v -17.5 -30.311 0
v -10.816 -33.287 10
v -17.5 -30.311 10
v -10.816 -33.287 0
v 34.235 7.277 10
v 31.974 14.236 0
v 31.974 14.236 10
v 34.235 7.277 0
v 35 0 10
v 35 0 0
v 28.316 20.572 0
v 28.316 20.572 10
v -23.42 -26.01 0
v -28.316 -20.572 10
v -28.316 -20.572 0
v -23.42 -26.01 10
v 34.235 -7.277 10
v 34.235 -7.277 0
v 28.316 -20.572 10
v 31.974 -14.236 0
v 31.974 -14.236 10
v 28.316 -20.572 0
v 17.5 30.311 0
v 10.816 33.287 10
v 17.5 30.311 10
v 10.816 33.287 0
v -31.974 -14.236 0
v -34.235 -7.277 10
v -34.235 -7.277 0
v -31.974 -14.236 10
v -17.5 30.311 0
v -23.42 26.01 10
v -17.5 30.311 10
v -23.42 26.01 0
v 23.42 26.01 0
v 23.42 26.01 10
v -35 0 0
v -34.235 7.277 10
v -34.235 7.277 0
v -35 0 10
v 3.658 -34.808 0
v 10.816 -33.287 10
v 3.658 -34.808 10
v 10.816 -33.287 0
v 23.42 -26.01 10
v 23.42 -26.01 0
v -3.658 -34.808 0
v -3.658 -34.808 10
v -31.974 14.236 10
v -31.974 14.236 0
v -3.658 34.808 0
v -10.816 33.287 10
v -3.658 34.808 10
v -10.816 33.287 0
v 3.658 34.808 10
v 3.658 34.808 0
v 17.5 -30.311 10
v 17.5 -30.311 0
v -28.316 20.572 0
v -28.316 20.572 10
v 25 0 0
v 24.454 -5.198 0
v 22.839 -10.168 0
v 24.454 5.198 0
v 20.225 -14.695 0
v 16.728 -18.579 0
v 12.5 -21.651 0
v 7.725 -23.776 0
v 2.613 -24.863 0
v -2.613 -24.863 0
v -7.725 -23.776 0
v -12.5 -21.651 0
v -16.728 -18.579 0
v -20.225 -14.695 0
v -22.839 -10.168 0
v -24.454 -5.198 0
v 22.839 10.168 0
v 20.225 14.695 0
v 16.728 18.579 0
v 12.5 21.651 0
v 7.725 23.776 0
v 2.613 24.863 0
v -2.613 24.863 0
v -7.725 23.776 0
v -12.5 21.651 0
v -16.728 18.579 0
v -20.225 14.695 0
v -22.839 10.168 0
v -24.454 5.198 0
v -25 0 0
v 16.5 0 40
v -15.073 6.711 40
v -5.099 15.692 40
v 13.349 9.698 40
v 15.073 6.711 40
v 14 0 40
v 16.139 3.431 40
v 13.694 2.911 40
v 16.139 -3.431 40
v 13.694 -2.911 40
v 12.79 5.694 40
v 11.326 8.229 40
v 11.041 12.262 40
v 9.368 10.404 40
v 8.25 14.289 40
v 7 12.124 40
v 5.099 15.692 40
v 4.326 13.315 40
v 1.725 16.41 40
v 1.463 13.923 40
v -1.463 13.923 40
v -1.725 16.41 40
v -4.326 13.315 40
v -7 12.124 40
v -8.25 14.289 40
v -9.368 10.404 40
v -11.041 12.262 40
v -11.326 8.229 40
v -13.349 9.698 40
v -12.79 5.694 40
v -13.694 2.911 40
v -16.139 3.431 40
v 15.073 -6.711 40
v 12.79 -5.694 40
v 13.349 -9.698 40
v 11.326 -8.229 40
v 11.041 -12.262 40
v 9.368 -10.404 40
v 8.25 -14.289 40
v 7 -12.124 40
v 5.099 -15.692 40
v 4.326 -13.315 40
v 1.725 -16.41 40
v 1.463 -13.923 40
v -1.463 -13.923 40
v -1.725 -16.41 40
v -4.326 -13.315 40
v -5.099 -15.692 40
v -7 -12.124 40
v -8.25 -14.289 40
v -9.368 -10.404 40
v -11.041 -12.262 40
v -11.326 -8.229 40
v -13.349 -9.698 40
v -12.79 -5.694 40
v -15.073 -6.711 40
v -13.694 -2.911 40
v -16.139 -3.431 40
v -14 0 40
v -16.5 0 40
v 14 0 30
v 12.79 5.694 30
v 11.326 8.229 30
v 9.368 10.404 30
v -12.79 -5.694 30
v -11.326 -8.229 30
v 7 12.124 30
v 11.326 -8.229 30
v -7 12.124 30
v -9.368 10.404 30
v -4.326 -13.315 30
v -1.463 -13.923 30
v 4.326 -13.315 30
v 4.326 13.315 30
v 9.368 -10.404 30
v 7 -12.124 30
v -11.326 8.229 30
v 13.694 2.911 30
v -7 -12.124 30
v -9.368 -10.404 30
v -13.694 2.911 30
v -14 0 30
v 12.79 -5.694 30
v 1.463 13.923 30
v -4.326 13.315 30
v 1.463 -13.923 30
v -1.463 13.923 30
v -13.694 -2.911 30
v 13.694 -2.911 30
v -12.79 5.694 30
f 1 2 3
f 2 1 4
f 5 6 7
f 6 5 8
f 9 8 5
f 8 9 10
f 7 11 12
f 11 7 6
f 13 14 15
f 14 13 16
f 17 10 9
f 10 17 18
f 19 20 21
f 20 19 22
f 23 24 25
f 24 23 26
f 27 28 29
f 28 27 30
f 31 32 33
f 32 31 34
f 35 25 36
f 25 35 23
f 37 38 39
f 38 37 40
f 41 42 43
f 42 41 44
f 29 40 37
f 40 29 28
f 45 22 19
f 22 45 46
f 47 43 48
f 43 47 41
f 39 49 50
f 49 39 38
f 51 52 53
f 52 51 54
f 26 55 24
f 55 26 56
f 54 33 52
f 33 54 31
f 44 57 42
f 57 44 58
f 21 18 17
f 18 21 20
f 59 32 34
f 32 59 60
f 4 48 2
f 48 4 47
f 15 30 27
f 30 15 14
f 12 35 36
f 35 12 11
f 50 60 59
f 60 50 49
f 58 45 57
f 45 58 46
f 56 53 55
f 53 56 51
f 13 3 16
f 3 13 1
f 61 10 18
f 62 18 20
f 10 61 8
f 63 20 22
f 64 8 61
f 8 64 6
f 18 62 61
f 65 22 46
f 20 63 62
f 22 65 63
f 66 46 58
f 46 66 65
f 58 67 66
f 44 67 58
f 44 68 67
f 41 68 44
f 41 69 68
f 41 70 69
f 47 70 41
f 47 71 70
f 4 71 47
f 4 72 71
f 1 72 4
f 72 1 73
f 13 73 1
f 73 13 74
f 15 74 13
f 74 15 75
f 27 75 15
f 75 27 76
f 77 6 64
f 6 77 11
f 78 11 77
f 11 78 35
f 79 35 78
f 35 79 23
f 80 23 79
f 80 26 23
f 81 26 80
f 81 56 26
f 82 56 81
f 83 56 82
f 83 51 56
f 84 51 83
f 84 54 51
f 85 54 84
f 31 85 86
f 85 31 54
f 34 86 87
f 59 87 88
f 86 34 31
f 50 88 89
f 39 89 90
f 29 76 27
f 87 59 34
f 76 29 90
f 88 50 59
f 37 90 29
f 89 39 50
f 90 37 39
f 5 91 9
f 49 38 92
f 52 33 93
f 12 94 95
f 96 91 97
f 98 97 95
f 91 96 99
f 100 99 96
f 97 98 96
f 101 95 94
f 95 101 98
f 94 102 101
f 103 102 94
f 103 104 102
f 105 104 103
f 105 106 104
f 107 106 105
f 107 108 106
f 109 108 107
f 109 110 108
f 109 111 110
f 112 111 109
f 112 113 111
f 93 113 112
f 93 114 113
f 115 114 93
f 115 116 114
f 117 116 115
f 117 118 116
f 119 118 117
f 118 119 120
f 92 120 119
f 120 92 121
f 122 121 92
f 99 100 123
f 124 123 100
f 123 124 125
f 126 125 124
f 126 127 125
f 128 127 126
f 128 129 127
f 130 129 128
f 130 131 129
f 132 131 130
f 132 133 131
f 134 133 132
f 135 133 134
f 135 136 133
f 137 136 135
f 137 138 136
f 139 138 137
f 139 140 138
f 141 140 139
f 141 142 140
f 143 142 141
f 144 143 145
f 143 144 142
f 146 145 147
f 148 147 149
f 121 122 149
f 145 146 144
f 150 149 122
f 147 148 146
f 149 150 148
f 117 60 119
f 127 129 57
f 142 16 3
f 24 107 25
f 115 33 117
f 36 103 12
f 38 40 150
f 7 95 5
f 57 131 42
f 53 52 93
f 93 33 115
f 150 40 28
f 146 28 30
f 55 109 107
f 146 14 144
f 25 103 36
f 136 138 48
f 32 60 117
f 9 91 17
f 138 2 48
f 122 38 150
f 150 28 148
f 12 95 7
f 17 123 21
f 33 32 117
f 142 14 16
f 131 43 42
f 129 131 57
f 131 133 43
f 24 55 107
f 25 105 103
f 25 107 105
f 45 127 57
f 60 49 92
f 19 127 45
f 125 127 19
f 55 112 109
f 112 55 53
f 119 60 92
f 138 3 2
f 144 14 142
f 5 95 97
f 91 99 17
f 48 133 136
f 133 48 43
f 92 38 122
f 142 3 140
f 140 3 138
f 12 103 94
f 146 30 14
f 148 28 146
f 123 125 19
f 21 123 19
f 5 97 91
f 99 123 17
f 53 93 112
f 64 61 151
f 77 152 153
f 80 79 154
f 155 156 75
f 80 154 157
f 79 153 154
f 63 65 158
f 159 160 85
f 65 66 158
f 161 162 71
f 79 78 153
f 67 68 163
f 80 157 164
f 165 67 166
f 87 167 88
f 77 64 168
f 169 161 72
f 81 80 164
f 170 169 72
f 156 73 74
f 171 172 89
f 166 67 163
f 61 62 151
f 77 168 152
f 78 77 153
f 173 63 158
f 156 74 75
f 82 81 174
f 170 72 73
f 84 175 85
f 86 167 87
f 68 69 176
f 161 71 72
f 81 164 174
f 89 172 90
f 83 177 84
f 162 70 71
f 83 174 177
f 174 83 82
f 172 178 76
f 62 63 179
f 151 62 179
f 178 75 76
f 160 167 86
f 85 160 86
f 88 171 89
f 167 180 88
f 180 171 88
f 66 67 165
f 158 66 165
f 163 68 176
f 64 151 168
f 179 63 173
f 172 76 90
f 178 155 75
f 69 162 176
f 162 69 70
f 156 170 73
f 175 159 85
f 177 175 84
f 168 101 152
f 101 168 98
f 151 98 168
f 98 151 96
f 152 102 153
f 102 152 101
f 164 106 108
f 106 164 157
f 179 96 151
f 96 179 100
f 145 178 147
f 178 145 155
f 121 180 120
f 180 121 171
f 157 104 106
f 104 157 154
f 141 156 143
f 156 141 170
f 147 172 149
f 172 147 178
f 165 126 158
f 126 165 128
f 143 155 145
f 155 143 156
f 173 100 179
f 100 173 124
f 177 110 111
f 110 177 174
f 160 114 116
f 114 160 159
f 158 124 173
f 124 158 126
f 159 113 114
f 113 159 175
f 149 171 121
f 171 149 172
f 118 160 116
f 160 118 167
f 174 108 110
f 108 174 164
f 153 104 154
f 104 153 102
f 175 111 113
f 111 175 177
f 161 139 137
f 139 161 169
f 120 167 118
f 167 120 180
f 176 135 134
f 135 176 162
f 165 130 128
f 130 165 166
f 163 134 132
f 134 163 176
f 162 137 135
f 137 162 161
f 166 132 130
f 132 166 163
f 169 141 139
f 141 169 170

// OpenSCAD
// NOTE: Please refer to the picture with drawing to get all the variables explained in details
/* [Outer Size] */
//Diameter of the pipe
pipe_diameter=28;
//Diameter of the base
base_diameter=70;
//Height of the base, before the loft will start
base_height=10;
// Height of the part with loft from base to to pipe diameter
loft_height=30;
// Note: Total height of part = loft_height + base_height
// Please refer to picture with drawing to better understand the variables, if in doubt
/* [Inner space] */
//Difference of the inner space's diameter to inner space's diameter at base level 
base_inner_diameter_decrease=20;
// Difference of top diameter to pipe's diameter
top_add_diameter=5;


/* [ Split into two halves?]*/
split=0; // [1:Yes, 0:No]
// Space between two halves 
space=30;
/* [Hidden]*/

if (split) {
// draw base as circle
difference(){
    draw_cap();
//subtract half of cap
translate([-base_diameter/2,0,0]) {
    cube([base_diameter,base_diameter/2,base_height+loft_height],center=false);
}
}
translate ([0,space,0]) {
    rotate ([0,0,180]){
    mirror ([1,0,0]){
difference(){
    draw_cap();
//subtract half of cap
translate([-base_diameter/2,0,0]) {
    cube([base_diameter,base_diameter/2,base_height+loft_height],center=false);
}
}
 }   
}
}
}else{
    draw_cap();
}



// make two halfs


module draw_cap(){
     difference(){ 
    union(){
        //draw the base
        cylinder(h=base_height, r=base_diameter/2, center=false);
        //draw the loft
        translate ([0,0,base_height]){
            cylinder(h=loft_height, r1=base_diameter/2, r2=(top_add_diameter+pipe_diameter)/2, center=false);
        }
    }
    //subtract the inner space
    translate ([0,0,0]){
          cylinder(h=loft_height, r1=(base_diameter-base_inner_diameter_decrease)/2, r2=pipe_diameter/2, center=false);
    }
    translate ([0,0,loft_height]) {
          cylinder(h=base_height, r=pipe_diameter/2, center=false);
    }}

}
